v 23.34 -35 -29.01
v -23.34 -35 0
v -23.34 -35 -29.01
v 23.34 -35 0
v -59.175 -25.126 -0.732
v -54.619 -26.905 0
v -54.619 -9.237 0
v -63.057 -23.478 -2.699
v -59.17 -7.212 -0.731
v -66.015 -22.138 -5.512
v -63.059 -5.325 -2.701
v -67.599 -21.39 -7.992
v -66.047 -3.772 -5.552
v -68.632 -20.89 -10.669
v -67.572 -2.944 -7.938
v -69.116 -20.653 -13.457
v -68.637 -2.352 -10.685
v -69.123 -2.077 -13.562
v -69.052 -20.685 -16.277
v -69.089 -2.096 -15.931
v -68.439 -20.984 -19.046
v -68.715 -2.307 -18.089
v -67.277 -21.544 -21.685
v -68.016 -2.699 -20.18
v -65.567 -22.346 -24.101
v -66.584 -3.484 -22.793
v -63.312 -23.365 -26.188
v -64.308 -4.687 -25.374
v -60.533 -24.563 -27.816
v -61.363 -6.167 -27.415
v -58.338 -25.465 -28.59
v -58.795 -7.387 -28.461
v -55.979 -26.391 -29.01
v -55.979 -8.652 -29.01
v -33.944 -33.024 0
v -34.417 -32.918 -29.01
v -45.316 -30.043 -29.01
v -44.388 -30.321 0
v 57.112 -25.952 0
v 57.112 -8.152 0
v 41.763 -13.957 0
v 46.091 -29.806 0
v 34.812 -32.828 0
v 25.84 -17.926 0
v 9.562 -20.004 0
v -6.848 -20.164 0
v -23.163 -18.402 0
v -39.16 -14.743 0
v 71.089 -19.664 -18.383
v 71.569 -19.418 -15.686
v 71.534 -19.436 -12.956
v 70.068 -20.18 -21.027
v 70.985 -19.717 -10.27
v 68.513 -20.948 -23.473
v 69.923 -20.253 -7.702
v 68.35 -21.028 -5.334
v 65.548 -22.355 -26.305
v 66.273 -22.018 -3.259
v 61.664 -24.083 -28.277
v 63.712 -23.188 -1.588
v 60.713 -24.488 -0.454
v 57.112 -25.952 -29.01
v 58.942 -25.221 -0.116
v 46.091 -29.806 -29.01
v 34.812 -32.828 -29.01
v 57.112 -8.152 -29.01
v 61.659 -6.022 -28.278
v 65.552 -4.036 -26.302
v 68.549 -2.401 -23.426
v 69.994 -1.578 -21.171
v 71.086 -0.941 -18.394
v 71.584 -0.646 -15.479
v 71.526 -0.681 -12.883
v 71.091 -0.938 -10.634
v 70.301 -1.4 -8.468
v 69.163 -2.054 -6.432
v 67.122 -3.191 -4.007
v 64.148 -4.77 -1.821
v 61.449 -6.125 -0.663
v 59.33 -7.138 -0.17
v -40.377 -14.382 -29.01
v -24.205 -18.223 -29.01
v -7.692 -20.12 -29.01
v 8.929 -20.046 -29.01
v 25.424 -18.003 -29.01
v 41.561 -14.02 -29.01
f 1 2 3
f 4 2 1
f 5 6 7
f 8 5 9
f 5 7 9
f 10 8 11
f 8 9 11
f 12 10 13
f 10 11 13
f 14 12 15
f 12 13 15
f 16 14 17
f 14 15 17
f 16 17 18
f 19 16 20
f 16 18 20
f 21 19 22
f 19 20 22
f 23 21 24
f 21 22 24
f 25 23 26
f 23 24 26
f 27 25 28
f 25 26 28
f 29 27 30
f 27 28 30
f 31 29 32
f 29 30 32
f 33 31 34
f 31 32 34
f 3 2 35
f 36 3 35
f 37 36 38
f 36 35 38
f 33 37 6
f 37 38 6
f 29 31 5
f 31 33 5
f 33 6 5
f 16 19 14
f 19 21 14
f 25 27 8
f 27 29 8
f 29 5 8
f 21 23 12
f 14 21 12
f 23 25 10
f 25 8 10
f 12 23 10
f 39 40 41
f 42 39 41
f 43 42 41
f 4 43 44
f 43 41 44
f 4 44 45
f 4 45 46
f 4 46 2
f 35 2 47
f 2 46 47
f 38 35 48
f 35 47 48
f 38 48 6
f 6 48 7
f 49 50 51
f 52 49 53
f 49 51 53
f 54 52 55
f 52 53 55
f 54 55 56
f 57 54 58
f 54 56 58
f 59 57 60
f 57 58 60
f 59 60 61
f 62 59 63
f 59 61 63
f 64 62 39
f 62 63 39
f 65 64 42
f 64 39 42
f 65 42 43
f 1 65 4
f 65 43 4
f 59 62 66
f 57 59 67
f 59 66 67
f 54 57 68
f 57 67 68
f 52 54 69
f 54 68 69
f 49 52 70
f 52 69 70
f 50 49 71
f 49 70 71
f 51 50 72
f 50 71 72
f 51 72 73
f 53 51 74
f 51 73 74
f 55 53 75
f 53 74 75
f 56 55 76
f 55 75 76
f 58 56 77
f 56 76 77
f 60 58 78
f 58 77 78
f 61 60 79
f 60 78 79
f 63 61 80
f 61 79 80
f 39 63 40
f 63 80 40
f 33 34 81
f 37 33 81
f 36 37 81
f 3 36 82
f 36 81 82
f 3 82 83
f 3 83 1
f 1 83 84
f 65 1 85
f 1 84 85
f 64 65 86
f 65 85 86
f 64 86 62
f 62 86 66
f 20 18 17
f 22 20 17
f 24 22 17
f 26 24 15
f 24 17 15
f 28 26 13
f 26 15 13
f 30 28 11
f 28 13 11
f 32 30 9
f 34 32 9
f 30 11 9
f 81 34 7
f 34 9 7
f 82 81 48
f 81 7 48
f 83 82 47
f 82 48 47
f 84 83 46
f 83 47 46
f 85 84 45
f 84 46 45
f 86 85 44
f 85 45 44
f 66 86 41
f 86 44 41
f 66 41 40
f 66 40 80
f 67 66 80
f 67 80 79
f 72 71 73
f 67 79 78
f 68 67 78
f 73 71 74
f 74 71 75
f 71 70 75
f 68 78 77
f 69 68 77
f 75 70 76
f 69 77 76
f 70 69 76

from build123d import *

# Parameters (mm, degrees)
F1_DEPTH = 35
F3_DEPTH = 29.010506
F4_DEPTH = 29.010506


with BuildPart() as f1:
    # F0 (on Front) → F1 (new body)
    with BuildSketch(Plane.XZ):
        with BuildLine():
            Line((57.11247, 0), (-54.619476, 0))
            ThreePointArc((-54.619476, 0), (-69.140156, -13.855967), (-55.979297, -29.009506))
            Line((-55.979297, -29.009506), (57.11247, -29.009506))
            ThreePointArc((57.11247, -29.009506), (71.617223, -14.504753), (57.11247, 0))
        make_face()
    extrude(amount=F1_DEPTH)

    # F2 (on Top) → F3 (cut, through all)
    with BuildSketch(Plane.XY):
        with BuildLine():
            Line((102.996904, 24.844682), (-105.220917, 27.318733))
            ThreePointArc((-105.220917, 27.318733), (-1.663367, -20.32119), (102.996904, 24.844682))
        make_face()
    extrude(amount=-F3_DEPTH, mode=Mode.SUBTRACT)

    # F2 (on Top) → F4 (cut, through all)
    with BuildSketch(Plane.XY):
        with BuildLine():
            ThreePointArc((115.077005, 13.723119), (-1.858457, -36.74008), (-117.561864, 16.487342))
            Line((-117.561864, 16.487342), (-117.561864, -55.866256))
            Line((-117.561864, -55.866256), (118.521035, -63.760579))
            Line((118.521035, -63.760579), (115.077005, 13.723119))
        make_face()
    extrude(amount=-F4_DEPTH, mode=Mode.SUBTRACT)


solid = f1.part
